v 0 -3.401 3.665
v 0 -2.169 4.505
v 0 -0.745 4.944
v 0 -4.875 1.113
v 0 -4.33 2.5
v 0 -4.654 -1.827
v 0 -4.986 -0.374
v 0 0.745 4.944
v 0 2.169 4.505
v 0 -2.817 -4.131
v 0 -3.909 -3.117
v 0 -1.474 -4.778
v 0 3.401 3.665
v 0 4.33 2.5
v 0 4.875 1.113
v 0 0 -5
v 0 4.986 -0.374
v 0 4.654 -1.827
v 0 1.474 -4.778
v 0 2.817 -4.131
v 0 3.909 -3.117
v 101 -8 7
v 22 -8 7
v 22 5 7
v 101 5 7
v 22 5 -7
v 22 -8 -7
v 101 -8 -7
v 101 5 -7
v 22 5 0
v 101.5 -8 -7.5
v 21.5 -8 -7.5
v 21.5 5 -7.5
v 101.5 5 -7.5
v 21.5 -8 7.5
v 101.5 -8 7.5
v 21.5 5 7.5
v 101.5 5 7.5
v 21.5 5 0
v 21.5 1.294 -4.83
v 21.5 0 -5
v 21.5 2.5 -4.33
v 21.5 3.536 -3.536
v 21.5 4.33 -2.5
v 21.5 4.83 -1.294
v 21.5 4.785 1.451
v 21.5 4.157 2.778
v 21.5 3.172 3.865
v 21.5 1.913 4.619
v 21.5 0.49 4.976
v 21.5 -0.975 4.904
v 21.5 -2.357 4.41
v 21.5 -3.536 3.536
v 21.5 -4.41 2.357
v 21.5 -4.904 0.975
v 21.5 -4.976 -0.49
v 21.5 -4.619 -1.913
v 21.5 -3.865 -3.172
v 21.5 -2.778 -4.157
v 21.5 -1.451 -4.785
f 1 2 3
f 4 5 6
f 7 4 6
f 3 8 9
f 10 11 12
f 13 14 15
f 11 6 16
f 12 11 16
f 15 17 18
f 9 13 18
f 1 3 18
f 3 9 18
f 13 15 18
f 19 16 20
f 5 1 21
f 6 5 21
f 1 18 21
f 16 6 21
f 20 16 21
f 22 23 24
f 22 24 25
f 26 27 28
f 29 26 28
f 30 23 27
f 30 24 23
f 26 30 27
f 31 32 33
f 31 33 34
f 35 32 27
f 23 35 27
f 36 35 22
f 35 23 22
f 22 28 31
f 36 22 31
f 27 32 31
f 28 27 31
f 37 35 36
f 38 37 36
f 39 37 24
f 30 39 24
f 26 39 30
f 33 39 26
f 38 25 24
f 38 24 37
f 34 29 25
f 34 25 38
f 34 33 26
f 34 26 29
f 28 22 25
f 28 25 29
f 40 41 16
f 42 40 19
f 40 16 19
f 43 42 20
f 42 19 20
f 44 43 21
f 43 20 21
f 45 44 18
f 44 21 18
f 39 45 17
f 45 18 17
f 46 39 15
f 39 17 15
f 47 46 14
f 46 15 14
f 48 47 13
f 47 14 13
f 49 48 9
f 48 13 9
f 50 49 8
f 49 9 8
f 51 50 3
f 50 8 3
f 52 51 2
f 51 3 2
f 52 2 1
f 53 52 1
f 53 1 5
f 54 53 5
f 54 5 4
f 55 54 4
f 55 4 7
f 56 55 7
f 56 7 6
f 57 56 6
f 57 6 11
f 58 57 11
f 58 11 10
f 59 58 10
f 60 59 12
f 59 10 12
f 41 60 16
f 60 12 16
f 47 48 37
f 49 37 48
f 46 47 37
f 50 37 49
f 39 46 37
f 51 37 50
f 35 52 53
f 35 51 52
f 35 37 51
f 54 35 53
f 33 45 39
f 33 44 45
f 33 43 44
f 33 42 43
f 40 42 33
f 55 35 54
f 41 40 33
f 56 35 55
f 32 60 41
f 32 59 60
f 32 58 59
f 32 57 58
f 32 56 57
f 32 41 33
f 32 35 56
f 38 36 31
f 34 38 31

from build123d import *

# Parameters (mm, degrees)
SKETCH1_R                = 5
BOSS_EXTRUDE1_DEPTH      = 22
BOSS_EXTRUDE2_DEPTH      = 5
BOSS_EXTRUDE2_DEPTH_BACK = 8
SKETCH2_W                = 80
SKETCH2_H                = 15
SKETCH2_W_2              = 79
SKETCH2_H_2              = 14


with BuildPart() as part:
    # Sketch1 → Boss-Extrude1 (new body)
    with BuildSketch(Plane(origin=(0, 0, 0), x_dir=(0, 0, -1), z_dir=(1, 0, 0))):
        Circle(SKETCH1_R)
    extrude(amount=BOSS_EXTRUDE1_DEPTH)

    # Sketch2 → Boss-Extrude2 (add, two sides: drawn at the far end of the back side and taken through both)
    with BuildSketch(Plane(origin=(0, 0, 0), x_dir=(1, 0, 0), z_dir=(0, 1, 0)).offset(-BOSS_EXTRUDE2_DEPTH_BACK)):
        with Locations((61.5, 0)):
            Rectangle(SKETCH2_W, SKETCH2_H)
        with Locations((61.5, 0)):
            Rectangle(SKETCH2_W_2, SKETCH2_H_2, mode=Mode.SUBTRACT)
    extrude(amount=BOSS_EXTRUDE2_DEPTH + BOSS_EXTRUDE2_DEPTH_BACK)


solid = part.part
